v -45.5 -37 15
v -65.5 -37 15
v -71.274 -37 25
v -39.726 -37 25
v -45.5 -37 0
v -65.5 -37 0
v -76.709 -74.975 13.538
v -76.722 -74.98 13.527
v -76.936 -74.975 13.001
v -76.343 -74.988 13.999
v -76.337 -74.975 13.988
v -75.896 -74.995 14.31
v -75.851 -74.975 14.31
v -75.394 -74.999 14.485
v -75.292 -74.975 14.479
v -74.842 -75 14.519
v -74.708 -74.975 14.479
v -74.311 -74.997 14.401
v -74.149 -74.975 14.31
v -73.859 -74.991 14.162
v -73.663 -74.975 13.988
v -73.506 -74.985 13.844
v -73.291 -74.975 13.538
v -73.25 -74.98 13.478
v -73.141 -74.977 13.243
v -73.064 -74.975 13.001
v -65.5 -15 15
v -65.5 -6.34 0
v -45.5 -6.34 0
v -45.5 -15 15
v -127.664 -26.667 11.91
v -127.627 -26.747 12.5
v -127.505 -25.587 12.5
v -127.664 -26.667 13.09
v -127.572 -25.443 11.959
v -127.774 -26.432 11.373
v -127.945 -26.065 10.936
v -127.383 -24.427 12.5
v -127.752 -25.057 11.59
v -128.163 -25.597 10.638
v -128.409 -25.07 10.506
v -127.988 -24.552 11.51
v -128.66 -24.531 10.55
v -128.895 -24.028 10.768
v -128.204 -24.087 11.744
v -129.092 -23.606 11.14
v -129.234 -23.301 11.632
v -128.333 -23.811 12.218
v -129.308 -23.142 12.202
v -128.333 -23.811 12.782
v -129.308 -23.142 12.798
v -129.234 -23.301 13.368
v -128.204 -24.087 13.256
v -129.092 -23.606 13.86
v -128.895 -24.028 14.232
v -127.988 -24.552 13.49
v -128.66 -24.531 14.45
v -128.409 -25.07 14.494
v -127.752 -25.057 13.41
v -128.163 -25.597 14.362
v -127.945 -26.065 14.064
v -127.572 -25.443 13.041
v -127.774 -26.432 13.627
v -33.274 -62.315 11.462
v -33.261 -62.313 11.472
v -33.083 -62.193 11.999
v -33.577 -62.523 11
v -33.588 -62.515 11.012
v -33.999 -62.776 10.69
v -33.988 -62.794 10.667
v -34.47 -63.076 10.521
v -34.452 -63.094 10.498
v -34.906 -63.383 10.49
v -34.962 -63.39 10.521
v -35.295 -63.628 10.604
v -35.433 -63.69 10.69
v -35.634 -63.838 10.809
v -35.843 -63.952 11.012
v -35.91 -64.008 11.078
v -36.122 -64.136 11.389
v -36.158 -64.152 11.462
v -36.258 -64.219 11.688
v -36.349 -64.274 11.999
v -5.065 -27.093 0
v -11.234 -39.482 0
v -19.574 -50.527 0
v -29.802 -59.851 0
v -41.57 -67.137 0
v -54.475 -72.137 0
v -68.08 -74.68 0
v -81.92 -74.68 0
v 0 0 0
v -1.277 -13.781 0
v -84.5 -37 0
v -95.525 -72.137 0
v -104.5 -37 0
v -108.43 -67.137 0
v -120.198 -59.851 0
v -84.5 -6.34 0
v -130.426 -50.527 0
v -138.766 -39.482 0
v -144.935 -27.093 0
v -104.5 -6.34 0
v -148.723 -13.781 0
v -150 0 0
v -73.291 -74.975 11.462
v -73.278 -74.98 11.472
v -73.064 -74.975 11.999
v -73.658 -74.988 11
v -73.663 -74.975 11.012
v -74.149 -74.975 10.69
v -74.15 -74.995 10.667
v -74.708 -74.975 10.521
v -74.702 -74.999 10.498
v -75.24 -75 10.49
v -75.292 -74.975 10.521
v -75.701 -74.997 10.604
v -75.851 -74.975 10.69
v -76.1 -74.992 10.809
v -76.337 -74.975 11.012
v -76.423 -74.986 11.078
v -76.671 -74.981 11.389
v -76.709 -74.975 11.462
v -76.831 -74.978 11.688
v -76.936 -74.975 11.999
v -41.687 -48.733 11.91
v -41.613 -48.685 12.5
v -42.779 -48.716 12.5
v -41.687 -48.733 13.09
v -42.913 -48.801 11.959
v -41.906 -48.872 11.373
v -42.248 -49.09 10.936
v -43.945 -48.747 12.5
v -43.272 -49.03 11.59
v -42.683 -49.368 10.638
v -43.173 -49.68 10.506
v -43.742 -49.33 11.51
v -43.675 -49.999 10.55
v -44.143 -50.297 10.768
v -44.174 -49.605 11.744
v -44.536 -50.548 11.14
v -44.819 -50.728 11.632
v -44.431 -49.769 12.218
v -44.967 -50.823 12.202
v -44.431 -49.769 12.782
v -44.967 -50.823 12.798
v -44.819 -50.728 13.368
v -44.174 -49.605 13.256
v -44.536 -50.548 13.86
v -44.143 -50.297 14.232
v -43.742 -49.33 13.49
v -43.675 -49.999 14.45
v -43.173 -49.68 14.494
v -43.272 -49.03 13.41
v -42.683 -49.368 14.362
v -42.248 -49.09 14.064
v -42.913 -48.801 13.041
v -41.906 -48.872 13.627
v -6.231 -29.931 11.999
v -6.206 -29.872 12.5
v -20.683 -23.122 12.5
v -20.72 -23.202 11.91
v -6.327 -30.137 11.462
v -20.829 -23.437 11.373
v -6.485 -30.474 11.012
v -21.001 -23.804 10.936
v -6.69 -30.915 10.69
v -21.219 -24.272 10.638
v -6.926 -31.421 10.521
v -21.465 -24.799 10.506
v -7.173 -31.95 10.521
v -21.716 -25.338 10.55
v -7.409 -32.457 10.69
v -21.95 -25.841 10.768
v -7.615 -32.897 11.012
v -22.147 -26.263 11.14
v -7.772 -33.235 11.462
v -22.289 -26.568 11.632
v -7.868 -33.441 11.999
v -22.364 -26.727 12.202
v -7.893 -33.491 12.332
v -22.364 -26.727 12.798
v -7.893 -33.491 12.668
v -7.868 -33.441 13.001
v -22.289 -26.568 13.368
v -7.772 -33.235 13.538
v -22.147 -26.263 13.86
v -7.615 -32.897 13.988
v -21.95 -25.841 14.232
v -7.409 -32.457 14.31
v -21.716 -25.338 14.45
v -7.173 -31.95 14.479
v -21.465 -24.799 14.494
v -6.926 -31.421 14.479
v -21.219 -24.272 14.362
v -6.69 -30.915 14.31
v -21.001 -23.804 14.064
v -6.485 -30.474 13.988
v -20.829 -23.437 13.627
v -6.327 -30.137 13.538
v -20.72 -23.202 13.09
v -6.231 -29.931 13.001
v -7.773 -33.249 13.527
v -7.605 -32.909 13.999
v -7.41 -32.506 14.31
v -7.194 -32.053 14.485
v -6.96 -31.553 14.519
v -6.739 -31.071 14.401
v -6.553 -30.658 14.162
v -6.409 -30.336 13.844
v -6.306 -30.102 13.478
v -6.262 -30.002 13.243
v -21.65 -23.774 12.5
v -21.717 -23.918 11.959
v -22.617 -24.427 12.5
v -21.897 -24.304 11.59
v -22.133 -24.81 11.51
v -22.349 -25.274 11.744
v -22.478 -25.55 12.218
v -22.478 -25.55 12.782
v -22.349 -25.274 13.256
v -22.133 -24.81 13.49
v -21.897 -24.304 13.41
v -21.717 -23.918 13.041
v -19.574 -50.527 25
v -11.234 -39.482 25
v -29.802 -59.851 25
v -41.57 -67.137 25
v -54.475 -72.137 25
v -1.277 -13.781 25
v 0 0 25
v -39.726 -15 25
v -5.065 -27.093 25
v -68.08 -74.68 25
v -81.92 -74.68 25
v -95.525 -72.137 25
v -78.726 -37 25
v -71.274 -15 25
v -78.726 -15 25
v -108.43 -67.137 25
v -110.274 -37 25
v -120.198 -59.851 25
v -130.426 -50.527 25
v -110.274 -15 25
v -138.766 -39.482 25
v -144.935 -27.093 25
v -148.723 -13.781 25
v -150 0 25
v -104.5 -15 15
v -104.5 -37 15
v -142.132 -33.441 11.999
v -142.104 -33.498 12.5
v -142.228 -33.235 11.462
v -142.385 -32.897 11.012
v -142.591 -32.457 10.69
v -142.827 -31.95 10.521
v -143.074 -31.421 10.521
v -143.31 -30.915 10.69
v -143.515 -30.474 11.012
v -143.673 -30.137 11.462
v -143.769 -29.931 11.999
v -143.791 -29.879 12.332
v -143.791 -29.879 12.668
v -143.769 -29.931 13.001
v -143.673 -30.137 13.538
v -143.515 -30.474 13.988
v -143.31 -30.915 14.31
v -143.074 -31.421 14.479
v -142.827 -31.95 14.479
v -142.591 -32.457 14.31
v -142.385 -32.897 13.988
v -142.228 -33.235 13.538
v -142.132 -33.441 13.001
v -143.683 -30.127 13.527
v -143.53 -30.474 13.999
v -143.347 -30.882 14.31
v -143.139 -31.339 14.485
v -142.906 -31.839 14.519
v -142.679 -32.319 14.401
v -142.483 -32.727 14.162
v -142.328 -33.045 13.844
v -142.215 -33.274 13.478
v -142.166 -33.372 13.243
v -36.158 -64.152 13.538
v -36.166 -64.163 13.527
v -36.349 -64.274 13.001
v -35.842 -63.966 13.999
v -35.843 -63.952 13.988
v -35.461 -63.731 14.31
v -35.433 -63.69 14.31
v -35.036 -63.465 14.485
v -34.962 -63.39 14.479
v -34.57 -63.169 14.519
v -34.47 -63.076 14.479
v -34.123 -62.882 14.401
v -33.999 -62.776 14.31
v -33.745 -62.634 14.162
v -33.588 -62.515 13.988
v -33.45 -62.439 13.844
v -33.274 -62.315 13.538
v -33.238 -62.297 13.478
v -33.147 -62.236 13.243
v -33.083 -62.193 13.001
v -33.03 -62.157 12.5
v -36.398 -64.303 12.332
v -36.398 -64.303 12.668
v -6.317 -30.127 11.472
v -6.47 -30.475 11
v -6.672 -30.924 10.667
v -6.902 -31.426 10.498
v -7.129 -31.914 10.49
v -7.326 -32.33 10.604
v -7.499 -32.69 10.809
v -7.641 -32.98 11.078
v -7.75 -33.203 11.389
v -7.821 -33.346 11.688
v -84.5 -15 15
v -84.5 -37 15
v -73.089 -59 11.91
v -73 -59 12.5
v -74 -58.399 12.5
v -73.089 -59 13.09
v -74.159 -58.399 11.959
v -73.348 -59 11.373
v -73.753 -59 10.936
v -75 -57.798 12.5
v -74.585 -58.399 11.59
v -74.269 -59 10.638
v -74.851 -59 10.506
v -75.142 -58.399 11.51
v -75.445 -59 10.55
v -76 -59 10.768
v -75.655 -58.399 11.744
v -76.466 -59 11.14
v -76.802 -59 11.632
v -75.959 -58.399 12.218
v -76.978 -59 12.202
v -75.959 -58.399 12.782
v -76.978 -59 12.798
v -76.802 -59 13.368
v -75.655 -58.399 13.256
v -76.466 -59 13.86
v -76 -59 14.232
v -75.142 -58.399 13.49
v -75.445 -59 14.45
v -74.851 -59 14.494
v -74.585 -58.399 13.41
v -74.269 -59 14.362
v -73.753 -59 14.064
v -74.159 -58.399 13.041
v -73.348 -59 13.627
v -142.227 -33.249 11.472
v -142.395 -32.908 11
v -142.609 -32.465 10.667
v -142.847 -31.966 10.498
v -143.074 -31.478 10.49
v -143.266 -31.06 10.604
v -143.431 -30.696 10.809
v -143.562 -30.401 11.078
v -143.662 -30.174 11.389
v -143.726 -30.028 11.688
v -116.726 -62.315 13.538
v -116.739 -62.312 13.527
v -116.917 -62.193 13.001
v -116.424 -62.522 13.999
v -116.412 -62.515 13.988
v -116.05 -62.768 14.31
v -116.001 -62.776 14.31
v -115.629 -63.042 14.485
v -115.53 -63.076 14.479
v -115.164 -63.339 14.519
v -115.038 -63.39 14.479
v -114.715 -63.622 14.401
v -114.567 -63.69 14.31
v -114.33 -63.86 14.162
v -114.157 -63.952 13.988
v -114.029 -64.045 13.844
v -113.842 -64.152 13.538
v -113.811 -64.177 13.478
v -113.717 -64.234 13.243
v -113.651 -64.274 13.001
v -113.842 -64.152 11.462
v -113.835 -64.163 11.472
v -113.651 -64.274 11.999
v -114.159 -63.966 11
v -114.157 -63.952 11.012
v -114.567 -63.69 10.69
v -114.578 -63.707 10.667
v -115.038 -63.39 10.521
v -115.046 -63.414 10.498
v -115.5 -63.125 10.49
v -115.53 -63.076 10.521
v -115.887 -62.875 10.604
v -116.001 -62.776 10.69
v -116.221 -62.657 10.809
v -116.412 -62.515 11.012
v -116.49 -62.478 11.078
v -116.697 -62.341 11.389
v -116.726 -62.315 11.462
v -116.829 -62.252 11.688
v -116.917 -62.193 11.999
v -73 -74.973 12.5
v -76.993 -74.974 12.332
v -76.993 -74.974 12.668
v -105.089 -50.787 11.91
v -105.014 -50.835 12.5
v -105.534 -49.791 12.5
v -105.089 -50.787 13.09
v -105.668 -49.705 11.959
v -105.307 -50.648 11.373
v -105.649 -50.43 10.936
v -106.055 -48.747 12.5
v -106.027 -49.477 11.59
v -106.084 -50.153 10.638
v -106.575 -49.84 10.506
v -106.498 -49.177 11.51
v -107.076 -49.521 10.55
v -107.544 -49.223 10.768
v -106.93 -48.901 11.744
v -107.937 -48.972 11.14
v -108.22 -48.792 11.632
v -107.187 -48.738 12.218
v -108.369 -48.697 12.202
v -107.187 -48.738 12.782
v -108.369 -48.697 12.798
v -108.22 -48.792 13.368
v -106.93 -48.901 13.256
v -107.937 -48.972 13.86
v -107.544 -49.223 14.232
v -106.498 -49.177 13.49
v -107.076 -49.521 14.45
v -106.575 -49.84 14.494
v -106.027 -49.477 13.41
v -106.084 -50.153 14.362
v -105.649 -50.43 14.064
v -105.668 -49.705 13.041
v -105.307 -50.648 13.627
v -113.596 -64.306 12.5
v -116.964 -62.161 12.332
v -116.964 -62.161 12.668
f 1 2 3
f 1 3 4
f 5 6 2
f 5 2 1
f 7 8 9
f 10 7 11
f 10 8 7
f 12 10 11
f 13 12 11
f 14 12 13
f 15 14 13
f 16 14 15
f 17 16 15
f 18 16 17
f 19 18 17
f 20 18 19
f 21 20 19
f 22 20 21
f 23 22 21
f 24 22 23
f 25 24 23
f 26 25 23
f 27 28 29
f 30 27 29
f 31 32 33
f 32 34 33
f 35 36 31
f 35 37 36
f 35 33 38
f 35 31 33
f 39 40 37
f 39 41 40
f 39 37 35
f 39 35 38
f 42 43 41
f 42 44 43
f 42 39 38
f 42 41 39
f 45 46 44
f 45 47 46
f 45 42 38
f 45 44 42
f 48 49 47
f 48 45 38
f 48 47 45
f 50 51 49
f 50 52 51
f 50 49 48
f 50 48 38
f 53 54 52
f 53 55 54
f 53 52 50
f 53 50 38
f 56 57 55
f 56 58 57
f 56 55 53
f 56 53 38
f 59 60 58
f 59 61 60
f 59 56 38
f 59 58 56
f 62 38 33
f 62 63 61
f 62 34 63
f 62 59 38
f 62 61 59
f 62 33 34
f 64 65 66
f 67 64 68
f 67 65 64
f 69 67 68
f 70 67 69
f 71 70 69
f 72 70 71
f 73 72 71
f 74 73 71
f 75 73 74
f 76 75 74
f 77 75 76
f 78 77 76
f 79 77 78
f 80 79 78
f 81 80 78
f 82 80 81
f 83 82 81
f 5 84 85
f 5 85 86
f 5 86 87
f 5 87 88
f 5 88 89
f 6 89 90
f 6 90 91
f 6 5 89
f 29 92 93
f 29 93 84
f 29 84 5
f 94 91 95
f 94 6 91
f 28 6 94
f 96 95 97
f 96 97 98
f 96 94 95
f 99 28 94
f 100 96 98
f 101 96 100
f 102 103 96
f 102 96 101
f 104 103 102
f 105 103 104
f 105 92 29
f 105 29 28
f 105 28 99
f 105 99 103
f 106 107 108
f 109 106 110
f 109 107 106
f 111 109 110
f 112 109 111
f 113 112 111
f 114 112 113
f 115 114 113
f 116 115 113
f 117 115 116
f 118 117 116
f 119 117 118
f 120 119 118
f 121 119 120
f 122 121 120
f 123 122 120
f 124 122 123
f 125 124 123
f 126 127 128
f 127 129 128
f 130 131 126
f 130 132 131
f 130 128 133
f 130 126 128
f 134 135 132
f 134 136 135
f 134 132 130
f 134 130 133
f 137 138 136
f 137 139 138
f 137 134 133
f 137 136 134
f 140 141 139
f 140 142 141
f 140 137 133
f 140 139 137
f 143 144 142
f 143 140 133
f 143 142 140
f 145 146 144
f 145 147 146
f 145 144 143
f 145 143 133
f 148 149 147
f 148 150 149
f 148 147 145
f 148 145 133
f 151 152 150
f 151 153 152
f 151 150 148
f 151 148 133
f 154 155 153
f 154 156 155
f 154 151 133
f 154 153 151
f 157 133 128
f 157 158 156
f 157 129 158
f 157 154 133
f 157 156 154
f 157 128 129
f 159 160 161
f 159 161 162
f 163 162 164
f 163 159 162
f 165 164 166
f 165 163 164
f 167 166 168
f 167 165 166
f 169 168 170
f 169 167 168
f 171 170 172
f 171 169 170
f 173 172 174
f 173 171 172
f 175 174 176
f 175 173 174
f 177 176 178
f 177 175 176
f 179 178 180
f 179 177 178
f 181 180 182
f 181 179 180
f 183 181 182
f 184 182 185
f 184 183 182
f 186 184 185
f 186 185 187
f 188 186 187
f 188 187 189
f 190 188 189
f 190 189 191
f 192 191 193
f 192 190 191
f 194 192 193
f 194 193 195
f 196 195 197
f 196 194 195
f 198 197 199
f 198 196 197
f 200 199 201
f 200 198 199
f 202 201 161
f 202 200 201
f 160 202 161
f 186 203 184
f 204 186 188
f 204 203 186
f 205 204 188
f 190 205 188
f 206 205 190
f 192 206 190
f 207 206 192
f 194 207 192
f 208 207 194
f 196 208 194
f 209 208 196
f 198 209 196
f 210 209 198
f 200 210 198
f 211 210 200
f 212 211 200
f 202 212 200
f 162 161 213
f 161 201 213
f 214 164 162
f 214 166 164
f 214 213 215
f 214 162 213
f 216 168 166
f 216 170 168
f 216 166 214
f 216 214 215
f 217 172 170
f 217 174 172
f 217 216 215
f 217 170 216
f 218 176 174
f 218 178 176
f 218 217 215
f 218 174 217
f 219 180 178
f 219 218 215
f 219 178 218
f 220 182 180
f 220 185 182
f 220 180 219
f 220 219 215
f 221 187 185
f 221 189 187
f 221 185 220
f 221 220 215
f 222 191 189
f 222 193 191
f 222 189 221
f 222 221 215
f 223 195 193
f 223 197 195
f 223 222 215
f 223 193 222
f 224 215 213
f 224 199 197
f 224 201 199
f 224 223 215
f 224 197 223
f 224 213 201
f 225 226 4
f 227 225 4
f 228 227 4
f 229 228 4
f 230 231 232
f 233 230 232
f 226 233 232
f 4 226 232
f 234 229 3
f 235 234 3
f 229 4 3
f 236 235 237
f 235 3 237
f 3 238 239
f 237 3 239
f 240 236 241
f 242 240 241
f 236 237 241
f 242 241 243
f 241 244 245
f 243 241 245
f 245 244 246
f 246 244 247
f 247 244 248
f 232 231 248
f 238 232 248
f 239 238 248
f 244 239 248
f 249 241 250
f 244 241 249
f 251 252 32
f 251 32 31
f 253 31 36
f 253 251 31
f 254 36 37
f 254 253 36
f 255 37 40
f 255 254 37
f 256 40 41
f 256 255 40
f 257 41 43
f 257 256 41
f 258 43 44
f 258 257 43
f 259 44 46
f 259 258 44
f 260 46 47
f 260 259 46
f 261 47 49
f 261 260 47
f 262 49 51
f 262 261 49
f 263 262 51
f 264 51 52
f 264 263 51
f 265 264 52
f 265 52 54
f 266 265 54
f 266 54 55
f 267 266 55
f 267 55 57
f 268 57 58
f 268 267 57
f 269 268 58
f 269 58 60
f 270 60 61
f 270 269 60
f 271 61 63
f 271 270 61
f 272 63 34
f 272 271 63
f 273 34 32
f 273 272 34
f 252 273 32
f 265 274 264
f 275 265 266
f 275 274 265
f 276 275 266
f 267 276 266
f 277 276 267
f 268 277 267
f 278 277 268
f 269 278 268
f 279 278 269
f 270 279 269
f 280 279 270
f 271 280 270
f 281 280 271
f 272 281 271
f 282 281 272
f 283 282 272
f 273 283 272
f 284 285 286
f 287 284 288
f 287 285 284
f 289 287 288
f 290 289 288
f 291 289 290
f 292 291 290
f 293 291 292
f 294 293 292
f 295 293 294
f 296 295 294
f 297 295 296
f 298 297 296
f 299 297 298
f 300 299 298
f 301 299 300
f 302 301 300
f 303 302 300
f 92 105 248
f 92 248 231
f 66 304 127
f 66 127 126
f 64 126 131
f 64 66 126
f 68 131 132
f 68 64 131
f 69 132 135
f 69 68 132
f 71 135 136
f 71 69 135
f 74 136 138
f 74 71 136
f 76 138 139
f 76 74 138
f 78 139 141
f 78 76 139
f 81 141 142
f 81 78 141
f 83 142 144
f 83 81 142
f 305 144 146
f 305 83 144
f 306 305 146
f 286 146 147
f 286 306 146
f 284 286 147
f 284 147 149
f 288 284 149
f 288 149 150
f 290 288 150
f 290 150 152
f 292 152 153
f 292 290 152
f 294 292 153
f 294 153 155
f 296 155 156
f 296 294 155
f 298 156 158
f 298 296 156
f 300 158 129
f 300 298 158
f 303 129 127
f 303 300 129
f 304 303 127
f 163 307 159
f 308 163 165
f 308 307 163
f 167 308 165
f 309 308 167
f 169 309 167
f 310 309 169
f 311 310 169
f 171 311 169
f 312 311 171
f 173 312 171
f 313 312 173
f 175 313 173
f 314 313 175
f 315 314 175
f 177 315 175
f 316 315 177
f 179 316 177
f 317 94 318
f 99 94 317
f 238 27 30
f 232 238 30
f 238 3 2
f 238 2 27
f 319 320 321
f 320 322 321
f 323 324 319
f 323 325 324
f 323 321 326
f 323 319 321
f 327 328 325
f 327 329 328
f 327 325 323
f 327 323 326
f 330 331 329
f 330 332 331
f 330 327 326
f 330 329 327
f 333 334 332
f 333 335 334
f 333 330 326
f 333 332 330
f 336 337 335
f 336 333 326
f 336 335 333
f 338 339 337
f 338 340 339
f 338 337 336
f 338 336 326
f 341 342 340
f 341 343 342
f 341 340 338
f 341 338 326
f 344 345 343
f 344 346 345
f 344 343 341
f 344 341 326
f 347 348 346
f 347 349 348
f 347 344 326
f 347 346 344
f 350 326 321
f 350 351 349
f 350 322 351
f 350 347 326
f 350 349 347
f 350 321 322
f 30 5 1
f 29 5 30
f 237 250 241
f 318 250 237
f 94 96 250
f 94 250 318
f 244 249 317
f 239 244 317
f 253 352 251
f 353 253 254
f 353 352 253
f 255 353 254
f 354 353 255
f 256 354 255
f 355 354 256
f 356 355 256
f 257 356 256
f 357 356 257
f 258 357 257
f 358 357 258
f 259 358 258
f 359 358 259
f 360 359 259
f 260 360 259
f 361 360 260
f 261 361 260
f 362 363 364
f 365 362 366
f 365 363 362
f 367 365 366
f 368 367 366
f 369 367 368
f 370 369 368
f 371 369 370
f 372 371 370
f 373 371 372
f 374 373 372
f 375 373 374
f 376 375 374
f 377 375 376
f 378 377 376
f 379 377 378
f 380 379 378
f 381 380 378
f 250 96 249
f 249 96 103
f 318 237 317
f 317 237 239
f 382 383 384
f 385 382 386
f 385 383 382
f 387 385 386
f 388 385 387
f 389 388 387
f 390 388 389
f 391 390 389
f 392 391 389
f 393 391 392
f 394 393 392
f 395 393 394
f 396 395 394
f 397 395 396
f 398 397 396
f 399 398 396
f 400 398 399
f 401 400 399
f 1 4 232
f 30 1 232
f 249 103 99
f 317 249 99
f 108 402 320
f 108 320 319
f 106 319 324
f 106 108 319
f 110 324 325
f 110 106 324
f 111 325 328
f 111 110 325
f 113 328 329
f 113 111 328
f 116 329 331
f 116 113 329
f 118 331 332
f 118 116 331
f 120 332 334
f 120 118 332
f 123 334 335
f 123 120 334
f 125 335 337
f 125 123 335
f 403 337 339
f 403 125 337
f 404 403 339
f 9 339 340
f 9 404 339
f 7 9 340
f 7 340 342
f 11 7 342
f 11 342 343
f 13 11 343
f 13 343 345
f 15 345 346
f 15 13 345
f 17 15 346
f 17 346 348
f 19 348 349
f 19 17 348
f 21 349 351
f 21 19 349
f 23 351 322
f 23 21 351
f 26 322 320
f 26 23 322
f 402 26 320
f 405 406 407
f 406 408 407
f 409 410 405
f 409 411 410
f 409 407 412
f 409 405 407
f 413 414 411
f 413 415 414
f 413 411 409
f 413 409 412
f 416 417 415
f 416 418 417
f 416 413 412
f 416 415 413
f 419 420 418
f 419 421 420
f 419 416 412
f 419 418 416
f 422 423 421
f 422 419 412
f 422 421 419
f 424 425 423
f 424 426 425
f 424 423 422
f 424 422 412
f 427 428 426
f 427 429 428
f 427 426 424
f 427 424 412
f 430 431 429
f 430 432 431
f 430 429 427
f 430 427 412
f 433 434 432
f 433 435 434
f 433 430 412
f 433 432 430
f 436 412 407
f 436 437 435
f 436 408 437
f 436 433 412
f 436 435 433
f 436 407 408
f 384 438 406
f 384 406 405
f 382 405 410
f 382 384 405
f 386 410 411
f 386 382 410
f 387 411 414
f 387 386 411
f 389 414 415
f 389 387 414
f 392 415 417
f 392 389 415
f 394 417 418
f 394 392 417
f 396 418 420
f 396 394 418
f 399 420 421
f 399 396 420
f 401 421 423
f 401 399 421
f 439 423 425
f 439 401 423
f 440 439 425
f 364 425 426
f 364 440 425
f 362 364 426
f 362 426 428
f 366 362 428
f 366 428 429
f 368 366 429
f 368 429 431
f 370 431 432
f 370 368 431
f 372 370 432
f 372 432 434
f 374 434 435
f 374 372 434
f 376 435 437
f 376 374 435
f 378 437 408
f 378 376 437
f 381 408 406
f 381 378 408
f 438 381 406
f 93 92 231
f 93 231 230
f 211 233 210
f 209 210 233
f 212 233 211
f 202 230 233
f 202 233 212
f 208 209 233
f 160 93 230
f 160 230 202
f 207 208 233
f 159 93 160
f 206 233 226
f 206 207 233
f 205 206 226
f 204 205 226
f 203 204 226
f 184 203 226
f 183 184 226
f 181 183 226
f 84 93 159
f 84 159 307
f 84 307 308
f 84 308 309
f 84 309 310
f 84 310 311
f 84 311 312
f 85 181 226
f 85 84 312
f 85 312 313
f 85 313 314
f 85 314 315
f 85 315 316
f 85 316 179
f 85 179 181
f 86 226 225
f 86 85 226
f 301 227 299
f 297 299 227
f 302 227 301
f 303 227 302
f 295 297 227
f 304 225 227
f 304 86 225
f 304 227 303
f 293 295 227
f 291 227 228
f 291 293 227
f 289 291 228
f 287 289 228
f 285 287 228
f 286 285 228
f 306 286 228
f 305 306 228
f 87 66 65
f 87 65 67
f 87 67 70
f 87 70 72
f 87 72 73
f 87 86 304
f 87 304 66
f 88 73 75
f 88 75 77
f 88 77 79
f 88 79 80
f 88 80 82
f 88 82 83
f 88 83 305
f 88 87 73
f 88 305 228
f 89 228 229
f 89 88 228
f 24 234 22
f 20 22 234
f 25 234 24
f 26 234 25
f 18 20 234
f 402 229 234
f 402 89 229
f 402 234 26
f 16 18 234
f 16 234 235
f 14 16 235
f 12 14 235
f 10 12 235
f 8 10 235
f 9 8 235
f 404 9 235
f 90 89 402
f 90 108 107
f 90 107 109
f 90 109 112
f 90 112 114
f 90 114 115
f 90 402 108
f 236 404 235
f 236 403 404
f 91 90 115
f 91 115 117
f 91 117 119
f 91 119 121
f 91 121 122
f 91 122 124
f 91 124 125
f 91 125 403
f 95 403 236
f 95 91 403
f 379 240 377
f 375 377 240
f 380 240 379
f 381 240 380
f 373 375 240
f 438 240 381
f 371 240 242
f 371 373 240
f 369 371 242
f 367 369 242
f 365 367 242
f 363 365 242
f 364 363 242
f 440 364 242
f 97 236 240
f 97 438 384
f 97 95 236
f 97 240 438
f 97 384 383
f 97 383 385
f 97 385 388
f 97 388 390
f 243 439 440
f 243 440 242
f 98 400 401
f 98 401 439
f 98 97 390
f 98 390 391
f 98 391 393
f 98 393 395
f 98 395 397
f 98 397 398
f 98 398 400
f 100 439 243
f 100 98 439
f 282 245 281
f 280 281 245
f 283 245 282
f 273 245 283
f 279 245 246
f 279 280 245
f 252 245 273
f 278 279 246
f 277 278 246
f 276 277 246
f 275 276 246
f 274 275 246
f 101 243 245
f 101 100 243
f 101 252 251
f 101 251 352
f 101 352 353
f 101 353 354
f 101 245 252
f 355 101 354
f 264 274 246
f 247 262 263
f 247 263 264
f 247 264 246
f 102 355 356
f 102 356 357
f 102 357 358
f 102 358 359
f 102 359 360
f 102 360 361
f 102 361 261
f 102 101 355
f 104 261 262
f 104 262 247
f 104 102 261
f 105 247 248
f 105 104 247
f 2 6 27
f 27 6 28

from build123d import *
from OCP.BRepFilletAPI import BRepFilletAPI_MakeChamfer

# Parameters (mm, degrees)
SKETCH1_W           = 20
SKETCH1_H           = 22
BOSS_EXTRUDE1_DEPTH = 25
CIRPATTERN1_COUNT   = 5
CIRPATTERN1_ANGLE   = 130
CHAMFER1_SIZE       = 15
CHAMFER1_SIZE2      = 8.660254038
CHAMFER3_SIZE       = 10
CHAMFER3_SIZE2      = 5.773502692


with BuildPart() as part:
    # Sketch1 → Boss-Extrude1 (new body)
    with BuildSketch(Plane.XY):
        with BuildLine():
            Line((-150, 0), (0, 0))
            ThreePointArc((0, 0), (-75, -75), (-150, 0))
        make_face()
        with Locations((-55.5, -26)):
            Rectangle(SKETCH1_W, SKETCH1_H, mode=Mode.SUBTRACT)
        with Locations((-94.5, -26)):
            Rectangle(SKETCH1_W, SKETCH1_H, mode=Mode.SUBTRACT)
    extrude(amount=BOSS_EXTRUDE1_DEPTH)

    # Sketch4 → Ø4.0mm Dowel Hole2 (revolve, cut)
    with BuildSketch(Plane(origin=(-7.026915972, -31.696369631, 12.5), x_dir=(0.4226182617407001, 0.9063077870366498, 0), z_dir=(0, 0, 1))):
        Polygon((0, 0), (0, 17.201721238), (2, 16), (2, 0.025), (2.025, 0), align=None)
    f_4_0mm_dowel_hole2 = revolve(axis=Axis((-1.271861525, -34.379995593, 12.5), (-0.9063077870366496, 0.42261826174070005, 0)), mode=Mode.SUBTRACT)

    # CirPattern1: Ø4.0mm Dowel Hole2 ×5 about axis
    cirpattern1_axis = Axis((-75, 0, 0), (0, 0, -1))
    for i in range(1, CIRPATTERN1_COUNT):
        add(f_4_0mm_dowel_hole2.rotate(cirpattern1_axis, i * CIRPATTERN1_ANGLE / (CIRPATTERN1_COUNT - 1)), mode=Mode.SUBTRACT)

    # Chamfer1: one chamfer whose edges measure the first distance from different faces: ONE call of the kernel's chamfer builder (chamfer() names one face for all edges)
    chamfer1_edges_1 = [part.edges().sort_by_distance(p)[0] for p in [
        (-55.5, -15, 0),
    ]]
    chamfer1_side_1 = [part.faces().sort_by_distance(p)[0] for p in [
        (-55.5, -15, 12.5),
    ]]
    chamfer1_edges_2 = [part.edges().sort_by_distance(p)[0] for p in [
        (-94.5, -15, 0),
    ]]
    chamfer1_side_2 = [part.faces().sort_by_distance(p)[0] for p in [
        (-94.5, -15, 12.5),
    ]]
    chamfer1 = BRepFilletAPI_MakeChamfer(part.part.solid().wrapped)
    for e in chamfer1_edges_1:
        chamfer1.Add(CHAMFER1_SIZE, CHAMFER1_SIZE2, e.wrapped, chamfer1_side_1[0].wrapped)  # the first distance lies on this face
    for e in chamfer1_edges_2:
        chamfer1.Add(CHAMFER1_SIZE, CHAMFER1_SIZE2, e.wrapped, chamfer1_side_2[0].wrapped)  # the first distance lies on this face
    add(Compound.cast(chamfer1.Shape()), mode=Mode.REPLACE)

    # Chamfer3: one chamfer whose edges measure the first distance from different faces: ONE call of the kernel's chamfer builder (chamfer() names one face for all edges)
    chamfer3_edges_1 = [part.edges().sort_by_distance(p)[0] for p in [
        (-104.5, -26, 25),
    ]]
    chamfer3_side_1 = [part.faces().sort_by_distance(p)[0] for p in [
        (-104.5, -24.533265853, 11.707841645),
    ]]
    chamfer3_edges_2 = [part.edges().sort_by_distance(p)[0] for p in [
        (-84.5, -26, 25),
    ]]
    chamfer3_side_2 = [part.faces().sort_by_distance(p)[0] for p in [
        (-84.5, -24.533265853, 11.707841645),
    ]]
    chamfer3_edges_3 = [part.edges().sort_by_distance(p)[0] for p in [
        (-45.5, -26, 25),
    ]]
    chamfer3_side_3 = [part.faces().sort_by_distance(p)[0] for p in [
        (-45.5, -24.533265853, 11.707841645),
    ]]
    chamfer3_edges_4 = [part.edges().sort_by_distance(p)[0] for p in [
        (-65.5, -26, 25),
    ]]
    chamfer3_side_4 = [part.faces().sort_by_distance(p)[0] for p in [
        (-65.5, -24.533265853, 11.707841645),
    ]]
    chamfer3 = BRepFilletAPI_MakeChamfer(part.part.solid().wrapped)
    for e in chamfer3_edges_1:
        chamfer3.Add(CHAMFER3_SIZE, CHAMFER3_SIZE2, e.wrapped, chamfer3_side_1[0].wrapped)  # the first distance lies on this face
    for e in chamfer3_edges_2:
        chamfer3.Add(CHAMFER3_SIZE, CHAMFER3_SIZE2, e.wrapped, chamfer3_side_2[0].wrapped)  # the first distance lies on this face
    for e in chamfer3_edges_3:
        chamfer3.Add(CHAMFER3_SIZE, CHAMFER3_SIZE2, e.wrapped, chamfer3_side_3[0].wrapped)  # the first distance lies on this face
    for e in chamfer3_edges_4:
        chamfer3.Add(CHAMFER3_SIZE, CHAMFER3_SIZE2, e.wrapped, chamfer3_side_4[0].wrapped)  # the first distance lies on this face
    add(Compound.cast(chamfer3.Shape()), mode=Mode.REPLACE)


solid = part.part
